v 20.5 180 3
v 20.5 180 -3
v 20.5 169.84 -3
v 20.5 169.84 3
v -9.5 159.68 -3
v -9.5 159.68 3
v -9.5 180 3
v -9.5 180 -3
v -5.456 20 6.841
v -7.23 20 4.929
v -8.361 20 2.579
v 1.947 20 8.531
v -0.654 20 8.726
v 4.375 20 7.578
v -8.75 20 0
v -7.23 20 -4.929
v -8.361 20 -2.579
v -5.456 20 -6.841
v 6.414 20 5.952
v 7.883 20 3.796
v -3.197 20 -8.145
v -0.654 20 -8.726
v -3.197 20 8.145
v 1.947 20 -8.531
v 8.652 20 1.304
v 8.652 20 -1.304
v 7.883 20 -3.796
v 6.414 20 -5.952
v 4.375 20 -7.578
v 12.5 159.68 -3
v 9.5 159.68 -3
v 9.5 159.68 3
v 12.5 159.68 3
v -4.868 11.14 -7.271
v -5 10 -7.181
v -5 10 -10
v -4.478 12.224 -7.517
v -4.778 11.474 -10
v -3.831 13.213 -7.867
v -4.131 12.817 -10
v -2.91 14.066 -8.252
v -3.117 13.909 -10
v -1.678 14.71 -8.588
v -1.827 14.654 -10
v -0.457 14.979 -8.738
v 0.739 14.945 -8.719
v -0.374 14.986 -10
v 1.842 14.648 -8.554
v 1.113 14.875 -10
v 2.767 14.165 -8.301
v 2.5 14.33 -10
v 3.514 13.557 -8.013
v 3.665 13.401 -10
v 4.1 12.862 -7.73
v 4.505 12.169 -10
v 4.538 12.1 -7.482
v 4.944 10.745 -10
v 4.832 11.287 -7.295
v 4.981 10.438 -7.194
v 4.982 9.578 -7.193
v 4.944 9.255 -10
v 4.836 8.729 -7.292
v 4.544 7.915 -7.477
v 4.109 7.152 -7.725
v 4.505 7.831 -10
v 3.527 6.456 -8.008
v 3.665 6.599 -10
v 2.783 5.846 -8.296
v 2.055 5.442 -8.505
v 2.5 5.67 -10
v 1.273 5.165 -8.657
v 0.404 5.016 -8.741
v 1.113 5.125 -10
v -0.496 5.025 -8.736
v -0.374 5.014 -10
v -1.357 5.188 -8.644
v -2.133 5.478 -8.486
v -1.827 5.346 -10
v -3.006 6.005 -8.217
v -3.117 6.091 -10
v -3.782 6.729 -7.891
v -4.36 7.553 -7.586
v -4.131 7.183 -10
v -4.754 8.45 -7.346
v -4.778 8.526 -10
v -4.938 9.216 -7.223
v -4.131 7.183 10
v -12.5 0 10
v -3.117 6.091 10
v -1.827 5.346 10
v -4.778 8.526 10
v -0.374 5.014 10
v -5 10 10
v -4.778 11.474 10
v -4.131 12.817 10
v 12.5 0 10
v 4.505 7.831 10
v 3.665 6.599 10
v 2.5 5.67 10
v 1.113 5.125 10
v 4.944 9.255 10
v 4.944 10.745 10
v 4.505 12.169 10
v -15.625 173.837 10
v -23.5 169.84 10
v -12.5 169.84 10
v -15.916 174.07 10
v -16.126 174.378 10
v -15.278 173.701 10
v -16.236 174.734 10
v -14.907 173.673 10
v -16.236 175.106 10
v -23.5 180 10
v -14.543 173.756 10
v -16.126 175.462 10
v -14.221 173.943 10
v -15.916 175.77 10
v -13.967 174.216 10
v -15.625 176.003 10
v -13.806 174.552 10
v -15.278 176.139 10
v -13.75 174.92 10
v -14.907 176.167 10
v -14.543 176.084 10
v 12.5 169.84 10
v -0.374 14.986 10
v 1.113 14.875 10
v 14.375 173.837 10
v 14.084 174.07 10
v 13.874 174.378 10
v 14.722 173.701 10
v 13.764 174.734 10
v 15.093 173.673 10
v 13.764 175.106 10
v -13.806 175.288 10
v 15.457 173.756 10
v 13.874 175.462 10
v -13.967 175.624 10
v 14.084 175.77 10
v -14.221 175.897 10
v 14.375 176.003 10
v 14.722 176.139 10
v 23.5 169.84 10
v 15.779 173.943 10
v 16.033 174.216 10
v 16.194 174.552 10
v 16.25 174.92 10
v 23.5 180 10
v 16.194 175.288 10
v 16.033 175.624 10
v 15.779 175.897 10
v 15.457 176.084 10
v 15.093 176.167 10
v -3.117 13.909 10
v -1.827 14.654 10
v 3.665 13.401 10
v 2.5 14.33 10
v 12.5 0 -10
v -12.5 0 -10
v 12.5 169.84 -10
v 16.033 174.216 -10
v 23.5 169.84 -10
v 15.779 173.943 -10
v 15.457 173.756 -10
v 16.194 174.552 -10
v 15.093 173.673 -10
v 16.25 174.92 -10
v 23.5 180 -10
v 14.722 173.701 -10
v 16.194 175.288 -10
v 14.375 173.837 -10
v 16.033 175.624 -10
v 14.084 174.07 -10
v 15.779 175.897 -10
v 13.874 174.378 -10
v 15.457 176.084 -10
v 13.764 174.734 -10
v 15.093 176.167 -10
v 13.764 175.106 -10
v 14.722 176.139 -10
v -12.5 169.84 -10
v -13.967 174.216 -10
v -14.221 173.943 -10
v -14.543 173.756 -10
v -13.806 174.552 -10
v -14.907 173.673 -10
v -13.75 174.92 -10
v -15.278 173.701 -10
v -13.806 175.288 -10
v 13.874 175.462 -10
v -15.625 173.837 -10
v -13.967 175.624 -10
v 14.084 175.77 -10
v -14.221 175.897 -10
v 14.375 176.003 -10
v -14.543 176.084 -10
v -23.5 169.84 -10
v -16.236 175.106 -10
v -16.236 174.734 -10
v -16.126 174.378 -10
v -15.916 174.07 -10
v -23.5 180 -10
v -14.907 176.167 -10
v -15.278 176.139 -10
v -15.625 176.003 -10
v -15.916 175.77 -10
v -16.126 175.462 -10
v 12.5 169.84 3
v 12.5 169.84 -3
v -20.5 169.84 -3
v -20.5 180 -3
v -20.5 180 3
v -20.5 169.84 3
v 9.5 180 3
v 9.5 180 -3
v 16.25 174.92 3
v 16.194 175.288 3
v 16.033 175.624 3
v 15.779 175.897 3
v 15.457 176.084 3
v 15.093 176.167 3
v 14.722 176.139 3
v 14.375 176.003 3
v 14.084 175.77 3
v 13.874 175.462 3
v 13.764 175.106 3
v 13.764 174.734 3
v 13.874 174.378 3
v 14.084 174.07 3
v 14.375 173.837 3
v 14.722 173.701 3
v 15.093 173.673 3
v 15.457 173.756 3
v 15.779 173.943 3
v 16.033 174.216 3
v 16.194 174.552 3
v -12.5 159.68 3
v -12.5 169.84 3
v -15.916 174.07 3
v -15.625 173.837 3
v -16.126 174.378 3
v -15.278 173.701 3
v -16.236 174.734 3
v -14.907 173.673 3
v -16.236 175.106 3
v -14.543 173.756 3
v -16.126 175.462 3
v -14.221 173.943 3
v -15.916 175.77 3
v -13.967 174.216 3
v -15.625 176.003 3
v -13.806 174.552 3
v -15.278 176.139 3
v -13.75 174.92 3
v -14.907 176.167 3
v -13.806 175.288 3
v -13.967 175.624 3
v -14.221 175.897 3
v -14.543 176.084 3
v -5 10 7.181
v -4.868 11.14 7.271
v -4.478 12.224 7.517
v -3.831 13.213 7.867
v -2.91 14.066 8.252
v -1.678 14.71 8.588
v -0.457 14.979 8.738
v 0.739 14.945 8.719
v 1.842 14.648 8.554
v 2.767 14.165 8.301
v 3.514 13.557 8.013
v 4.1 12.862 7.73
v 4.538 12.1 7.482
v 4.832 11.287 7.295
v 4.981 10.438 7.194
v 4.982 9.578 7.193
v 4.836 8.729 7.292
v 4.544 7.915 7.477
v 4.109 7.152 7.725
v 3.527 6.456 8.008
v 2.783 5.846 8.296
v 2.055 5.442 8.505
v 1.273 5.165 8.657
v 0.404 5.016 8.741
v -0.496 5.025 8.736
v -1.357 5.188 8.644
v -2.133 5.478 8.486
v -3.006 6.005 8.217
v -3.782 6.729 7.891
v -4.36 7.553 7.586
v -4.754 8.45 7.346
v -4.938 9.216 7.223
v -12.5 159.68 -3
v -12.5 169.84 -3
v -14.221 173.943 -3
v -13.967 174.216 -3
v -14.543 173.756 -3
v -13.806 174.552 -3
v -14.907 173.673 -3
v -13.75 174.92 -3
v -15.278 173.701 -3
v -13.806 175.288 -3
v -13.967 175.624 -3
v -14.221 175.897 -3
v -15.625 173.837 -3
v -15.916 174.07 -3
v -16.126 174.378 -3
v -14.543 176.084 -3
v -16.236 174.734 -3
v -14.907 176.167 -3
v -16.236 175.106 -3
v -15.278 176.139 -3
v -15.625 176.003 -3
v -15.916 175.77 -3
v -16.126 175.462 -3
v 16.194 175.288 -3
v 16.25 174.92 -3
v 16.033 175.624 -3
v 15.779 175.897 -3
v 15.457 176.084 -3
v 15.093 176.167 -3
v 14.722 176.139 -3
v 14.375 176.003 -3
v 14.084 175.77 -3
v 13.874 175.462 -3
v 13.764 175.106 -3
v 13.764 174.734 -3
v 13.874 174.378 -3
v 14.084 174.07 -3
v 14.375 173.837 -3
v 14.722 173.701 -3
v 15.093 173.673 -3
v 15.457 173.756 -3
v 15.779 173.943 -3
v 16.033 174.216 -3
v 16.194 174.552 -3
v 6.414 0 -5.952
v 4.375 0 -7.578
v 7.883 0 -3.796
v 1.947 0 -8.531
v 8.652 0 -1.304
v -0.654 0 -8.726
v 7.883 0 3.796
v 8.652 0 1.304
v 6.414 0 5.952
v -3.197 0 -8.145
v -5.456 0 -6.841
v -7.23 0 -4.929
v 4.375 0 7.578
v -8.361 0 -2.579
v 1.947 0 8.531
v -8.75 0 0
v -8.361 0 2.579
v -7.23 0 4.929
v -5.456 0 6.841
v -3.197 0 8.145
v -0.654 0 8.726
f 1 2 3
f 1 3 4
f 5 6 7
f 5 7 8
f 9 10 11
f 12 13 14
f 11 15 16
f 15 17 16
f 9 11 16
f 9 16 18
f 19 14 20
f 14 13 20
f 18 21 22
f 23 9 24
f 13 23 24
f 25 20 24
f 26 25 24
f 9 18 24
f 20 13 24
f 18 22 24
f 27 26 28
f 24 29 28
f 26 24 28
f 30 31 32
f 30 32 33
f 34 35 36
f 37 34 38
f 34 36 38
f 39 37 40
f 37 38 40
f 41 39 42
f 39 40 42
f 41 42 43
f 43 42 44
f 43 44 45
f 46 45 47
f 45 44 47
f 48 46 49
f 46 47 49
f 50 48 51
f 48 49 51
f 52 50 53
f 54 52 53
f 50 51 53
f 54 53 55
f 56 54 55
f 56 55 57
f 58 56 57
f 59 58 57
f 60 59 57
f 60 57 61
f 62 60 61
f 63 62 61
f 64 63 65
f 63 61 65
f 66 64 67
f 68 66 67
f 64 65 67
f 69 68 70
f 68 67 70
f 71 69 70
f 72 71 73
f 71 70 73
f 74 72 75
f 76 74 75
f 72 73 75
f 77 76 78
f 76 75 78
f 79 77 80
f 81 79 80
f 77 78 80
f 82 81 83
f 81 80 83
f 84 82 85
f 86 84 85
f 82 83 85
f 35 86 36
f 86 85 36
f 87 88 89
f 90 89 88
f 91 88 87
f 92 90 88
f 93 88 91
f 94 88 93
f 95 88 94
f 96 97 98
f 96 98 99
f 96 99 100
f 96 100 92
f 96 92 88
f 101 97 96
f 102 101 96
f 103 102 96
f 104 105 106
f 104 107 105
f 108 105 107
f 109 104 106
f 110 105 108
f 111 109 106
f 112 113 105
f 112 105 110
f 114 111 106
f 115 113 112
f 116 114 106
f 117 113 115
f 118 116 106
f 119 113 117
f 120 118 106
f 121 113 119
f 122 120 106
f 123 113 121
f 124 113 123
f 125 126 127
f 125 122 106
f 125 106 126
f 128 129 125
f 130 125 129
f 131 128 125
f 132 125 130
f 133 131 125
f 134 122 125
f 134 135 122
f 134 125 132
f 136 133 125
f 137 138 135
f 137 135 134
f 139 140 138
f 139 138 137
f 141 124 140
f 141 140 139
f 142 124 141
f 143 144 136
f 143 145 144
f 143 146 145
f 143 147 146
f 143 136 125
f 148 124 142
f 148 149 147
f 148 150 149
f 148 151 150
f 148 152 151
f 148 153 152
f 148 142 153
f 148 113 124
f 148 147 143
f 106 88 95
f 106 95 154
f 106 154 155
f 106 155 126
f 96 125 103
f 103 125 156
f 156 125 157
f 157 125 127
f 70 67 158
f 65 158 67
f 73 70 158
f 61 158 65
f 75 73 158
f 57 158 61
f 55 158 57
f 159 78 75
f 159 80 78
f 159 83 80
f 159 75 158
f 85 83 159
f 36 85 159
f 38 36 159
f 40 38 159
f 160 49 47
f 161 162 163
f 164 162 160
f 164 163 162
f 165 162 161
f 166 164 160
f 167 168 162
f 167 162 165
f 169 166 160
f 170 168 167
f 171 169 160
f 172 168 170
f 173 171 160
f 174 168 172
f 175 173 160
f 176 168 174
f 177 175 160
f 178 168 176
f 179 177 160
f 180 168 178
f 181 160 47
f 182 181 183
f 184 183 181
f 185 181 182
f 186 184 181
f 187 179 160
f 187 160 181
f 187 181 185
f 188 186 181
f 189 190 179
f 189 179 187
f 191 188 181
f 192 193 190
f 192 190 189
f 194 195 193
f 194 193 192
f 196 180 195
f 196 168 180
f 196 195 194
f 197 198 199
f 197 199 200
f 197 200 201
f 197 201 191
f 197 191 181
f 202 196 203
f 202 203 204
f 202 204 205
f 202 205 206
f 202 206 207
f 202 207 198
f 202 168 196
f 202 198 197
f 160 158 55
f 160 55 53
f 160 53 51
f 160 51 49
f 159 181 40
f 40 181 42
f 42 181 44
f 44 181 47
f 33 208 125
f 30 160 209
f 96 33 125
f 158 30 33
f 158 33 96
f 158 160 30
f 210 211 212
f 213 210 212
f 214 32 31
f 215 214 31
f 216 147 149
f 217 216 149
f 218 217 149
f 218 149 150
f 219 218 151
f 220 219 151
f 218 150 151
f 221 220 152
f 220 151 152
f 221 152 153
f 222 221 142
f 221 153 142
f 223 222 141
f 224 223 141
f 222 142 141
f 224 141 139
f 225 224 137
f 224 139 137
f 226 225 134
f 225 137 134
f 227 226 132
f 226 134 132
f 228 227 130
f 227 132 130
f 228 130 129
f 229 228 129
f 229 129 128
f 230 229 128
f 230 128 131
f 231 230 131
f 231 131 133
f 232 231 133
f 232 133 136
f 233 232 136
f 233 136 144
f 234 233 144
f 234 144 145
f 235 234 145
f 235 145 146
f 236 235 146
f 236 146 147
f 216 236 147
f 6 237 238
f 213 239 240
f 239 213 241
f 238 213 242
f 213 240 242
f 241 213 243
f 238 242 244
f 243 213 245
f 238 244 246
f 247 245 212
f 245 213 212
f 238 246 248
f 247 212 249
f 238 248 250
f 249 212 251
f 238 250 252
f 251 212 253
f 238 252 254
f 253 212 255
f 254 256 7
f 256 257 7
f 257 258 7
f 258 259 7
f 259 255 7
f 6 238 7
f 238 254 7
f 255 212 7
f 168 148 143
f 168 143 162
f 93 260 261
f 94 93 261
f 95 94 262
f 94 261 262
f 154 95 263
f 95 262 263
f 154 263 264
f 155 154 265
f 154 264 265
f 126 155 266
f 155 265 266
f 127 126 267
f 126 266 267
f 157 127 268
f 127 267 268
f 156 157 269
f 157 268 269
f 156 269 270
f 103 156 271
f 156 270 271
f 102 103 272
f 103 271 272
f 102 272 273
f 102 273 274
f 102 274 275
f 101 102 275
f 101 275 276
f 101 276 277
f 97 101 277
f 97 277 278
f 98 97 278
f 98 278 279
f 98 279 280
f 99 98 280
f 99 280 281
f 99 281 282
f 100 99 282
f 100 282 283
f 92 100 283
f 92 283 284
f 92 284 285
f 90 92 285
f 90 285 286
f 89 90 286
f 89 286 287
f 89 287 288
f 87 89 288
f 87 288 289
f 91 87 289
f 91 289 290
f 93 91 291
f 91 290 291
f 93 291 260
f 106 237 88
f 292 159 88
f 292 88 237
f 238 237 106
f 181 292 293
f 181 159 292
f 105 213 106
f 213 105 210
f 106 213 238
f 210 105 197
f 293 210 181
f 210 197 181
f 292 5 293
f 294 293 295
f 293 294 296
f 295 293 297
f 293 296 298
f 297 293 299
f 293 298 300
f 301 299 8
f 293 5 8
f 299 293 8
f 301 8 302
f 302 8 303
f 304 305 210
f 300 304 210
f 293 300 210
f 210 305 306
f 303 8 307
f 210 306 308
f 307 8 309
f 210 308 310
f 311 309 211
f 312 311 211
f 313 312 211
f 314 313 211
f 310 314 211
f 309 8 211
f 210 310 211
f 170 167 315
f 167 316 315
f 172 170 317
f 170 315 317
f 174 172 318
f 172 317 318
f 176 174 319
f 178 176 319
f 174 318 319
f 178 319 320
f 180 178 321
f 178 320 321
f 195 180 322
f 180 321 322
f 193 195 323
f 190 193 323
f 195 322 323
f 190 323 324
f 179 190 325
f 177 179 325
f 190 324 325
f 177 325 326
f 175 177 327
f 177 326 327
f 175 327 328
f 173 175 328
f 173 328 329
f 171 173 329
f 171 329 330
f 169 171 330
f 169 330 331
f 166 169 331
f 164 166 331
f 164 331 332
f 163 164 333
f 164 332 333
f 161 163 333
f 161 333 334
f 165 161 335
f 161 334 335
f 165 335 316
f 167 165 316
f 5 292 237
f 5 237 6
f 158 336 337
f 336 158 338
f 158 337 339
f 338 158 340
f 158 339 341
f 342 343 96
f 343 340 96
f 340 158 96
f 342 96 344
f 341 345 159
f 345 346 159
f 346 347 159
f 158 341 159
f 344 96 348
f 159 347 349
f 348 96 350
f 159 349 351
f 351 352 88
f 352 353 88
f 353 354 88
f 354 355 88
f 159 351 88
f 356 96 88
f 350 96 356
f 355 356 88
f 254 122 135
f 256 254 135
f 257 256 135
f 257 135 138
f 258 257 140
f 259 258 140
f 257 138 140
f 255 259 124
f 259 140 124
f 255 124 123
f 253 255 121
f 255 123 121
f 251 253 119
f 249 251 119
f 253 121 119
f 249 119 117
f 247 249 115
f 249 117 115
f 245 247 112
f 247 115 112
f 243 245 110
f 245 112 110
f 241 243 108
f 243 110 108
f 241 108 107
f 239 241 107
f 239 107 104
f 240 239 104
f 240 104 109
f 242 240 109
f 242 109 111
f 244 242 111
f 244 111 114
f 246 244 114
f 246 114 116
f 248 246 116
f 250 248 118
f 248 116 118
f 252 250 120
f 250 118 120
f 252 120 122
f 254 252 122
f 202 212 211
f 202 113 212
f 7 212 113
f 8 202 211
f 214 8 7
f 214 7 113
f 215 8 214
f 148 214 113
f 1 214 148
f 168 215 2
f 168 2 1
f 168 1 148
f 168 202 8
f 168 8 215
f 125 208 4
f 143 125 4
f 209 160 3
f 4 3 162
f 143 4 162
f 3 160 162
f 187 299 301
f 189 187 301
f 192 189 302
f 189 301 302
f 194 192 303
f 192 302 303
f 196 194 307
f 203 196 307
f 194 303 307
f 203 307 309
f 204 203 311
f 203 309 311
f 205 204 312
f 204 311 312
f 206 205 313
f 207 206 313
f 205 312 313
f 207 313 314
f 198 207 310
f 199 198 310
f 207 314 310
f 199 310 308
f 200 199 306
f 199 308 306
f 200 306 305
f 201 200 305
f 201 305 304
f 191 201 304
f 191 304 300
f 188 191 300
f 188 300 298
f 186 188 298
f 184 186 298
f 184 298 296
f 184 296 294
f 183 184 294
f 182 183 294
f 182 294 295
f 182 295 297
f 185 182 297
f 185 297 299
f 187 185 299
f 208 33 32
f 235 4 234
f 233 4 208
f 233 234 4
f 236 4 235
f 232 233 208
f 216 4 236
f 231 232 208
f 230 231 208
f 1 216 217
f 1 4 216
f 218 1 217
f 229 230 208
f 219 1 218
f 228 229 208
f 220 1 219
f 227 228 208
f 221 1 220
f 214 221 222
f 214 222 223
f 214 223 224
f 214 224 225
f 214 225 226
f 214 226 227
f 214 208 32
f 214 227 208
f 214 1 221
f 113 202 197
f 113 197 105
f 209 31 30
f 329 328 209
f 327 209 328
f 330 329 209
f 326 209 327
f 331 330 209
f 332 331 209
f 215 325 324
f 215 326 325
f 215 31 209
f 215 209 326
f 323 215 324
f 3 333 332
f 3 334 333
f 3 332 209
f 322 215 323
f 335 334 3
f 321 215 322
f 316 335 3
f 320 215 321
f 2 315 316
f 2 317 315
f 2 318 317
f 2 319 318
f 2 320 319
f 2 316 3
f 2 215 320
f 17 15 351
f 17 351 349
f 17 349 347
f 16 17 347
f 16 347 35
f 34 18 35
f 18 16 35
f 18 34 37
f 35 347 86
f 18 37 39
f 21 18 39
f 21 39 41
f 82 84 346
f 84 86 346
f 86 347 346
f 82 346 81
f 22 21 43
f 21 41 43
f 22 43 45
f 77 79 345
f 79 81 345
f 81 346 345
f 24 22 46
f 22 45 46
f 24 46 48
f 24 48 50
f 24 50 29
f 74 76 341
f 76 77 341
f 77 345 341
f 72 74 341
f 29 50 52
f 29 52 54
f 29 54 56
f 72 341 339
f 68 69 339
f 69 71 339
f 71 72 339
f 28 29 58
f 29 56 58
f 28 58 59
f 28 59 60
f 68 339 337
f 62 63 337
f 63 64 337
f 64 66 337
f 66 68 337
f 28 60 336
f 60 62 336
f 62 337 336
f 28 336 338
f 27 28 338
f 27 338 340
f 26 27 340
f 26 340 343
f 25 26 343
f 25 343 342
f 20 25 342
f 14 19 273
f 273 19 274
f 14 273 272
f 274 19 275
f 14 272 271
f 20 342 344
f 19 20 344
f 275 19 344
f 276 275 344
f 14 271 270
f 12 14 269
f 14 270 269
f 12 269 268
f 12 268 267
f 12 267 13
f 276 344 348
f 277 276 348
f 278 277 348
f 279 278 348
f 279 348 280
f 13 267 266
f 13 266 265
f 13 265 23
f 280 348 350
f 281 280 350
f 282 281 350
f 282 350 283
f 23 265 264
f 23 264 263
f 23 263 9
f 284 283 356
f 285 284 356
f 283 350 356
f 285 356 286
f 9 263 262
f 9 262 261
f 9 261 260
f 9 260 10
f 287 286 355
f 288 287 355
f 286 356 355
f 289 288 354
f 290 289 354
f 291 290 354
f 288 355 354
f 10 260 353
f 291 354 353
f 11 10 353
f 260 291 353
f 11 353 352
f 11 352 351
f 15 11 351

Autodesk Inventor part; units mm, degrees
ref_plane "YZ Plane" through (0, 0, 0) normal (1, 0, 0) x (0, 1, 0)
sketch "스케치1" plane through (0, 0, 0) normal (0, 1, 0) x (-1, 0, 0)
  line L0 (-12.5, 10) -> (12.5, 10)
  line L1 (12.5, 10) -> (12.5, -10)
  line L2 (12.5, -10) -> (-12.5, -10)
  line L3 (-12.5, -10) -> (-12.5, 10)
  line L4 (-12.5, 10) -> (12.5, -10) construction
  line L5 (12.5, 10) -> (-12.5, -10) construction
  circle A0 centre (0, 0) radius 8.75
  dimension "d0" = 25
  dimension "d1" = 20
  dimension "d2" = 17.5
extrude "돌출1" add sketch "스케치1" along normal blind 20
sketch "스케치2" plane through (12.5, 0, -10) normal (0, 0, -1) x (-1, 0, 0)
  circle A0 centre (12.5, 10) radius 5
  line L0 (0, 0) -> (25, 0) projected
  point P0 (12.5, 0)
  point P1 (12.5, 0)
  point P2 (12.5, 0)
  dimension "d5" = 10
  dimension "d6" = 10
extrude "돌출2" cut sketch "스케치2" against normal up to surface (20 mm away)
sketch "스케치3" plane through (0, 20, 0) normal (0, 1, 0) x (1, 0, 0)
  line L0 (12.5, 10) -> (-12.5, 10) projected
  line L1 (-12.5, 10) -> (-12.5, -10) projected
  line L2 (-12.5, -10) -> (12.5, -10) projected
  line L3 (12.5, -10) -> (12.5, 10) projected
  circle A0 centre (0, 0) radius 8.75 projected
extrude "돌출3" add sketch "스케치3" along normal blind 160 contours L3 L2 L1 L0 | A0
sketch "스케치21" plane through (-12.5, 0, 10) normal (0, 0, 1) x (1, 0, 0)
  line L0 (25, 180) -> (0, 180) projected
  line L1 (25, 0) -> (25, 180) projected
  line L2 (0, 180) -> (25, 180)
  line L3 (25, 180) -> (25, 165)
  line L4 (25, 165) -> (0, 165)
  line L5 (0, 165) -> (0, 180)
  point P0 (12.5, 0)
  dimension "d153" = 15
extrude "돌출8" cut sketch "스케치21" against normal blind 0.5
ref_plane "작업 평면1" through (12.5, 0, 0) normal (0, 0, -1) x (-1, 0, 0)
mirror "미러1" about plane through (12.5, 0, 0) normal (0, 0, -1) of "돌출8"
sketch "스케치23" plane through (0, 180, 0) normal (0, 1, 0) x (1, 0, 0)
  circle A0 centre (0, 0) radius 4.5
  line L0 (-2.5981, -4.5) -> (-5.1962, 0)
  line L1 (-5.1962, 0) -> (-2.5981, 4.5)
  line L2 (-2.5981, 4.5) -> (2.5981, 4.5)
  line L3 (2.5981, 4.5) -> (5.1962, 0)
  line L4 (5.1962, 0) -> (2.5981, -4.5)
  line L5 (2.5981, -4.5) -> (-2.5981, -4.5)
  dimension "d162" = 9
extrude "돌출10" cut sketch "스케치23" against normal blind 8
sketch "스케치25" plane through (0, 172, 0) normal (0, 1, 0) x (1, 0, 0)
  line L0 (2.0207, 3.5) -> (4.0415, 0)
  line L1 (4.0415, 0) -> (2.0207, -3.5)
  line L2 (2.0207, -3.5) -> (-2.0207, -3.5)
  line L3 (-2.0207, -3.5) -> (-4.0415, 0)
  line L4 (-4.0415, 0) -> (-2.0207, 3.5)
  line L5 (-2.0207, 3.5) -> (2.0207, 3.5)
  line L6 (-5.1962, 0) -> (-2.5981, 4.5) projected
  line L7 (2.5981, -4.5) -> (-2.5981, -4.5) projected
  line L8 (5.1962, 0) -> (2.5981, -4.5) projected
  line L9 (2.5981, 4.5) -> (5.1962, 0) projected
  line L10 (-2.5981, 4.5) -> (2.5981, 4.5) projected
  line L11 (-5.1962, 0) -> (-2.5981, 4.5) projected
  line L12 (-2.5981, -4.5) -> (-5.1962, 0) projected
  point P0 (0, 0)
  point P1 (0, 0)
  dimension "d166" = 1
extrude "돌출11" add sketch "스케치25" along normal blind 4.5
sketch "스케치26" plane through (0, 180, 0) normal (0, 1, 0) x (1, 0, 0)
  line L0 (23.5, 10) -> (-23.5, 10)
  line L1 (-23.5, 10) -> (-23.5, -10)
  line L2 (-23.5, -10) -> (23.5, -10)
  line L3 (23.5, -10) -> (23.5, 10)
  line L4 (23.5, 10) -> (-23.5, -10) construction
  line L5 (-23.5, 10) -> (23.5, -10) construction
  line L6 (-9.5, 3) -> (-20.5, 3)
  line L7 (-20.5, 3) -> (-20.5, -3)
  line L8 (-20.5, -3) -> (-9.5, -3)
  line L9 (-9.5, -3) -> (-9.5, 3)
  line L10 (-9.5, 3) -> (-20.5, -3) construction
  line L11 (-20.5, 3) -> (-9.5, -3) construction
  line L12 (-12.5, -9.5) -> (12.5, -9.5) projected
  line L13 (0, -9.5) -> (0, 10)
  line L14 (-5, 10) -> (5, 10) projected
  line L15 (23.5, 10) -> (23.5, -10)
  line L16 (9.5, 3) -> (20.5, 3)
  line L17 (20.5, 3) -> (20.5, -3)
  line L18 (20.5, -3) -> (9.5, -3)
  line L19 (9.5, -3) -> (9.5, 3)
  point P0 (0, 0)
  point P1 (-15, 0)
  dimension "d169" = 15
  dimension "d170" = 11
  dimension "d172" = 3
  dimension "d173" = 6
  dimension "d174" = 7
extrude "돌출12" add sketch "스케치26" against normal blind 10.16
sketch "스케치27" plane through (0, 180, 0) normal (0, 1, 0) x (1, 0, 0)
  line L0 (-9.5, 3) -> (-12.5, 3)
  line L1 (-12.5, 3) -> (-12.5, -3)
  line L2 (-12.5, -3) -> (-9.5, -3)
  line L3 (-9.5, -3) -> (-9.5, 3)
  line L4 (-9.5, 3) -> (-12.5, -3) construction
  line L5 (-12.5, 3) -> (-9.5, -3) construction
  line L6 (0, 0) -> (0, 9.5)
  line L7 (12.5, 9.5) -> (-12.5, 9.5) projected
  line L8 (9.5, 3) -> (12.5, 3)
  line L9 (12.5, 3) -> (12.5, -3)
  line L10 (12.5, -3) -> (9.5, -3)
  line L11 (9.5, -3) -> (9.5, 3)
  line L12 (9.5, 3) -> (12.5, -3) construction
  line L13 (12.5, 3) -> (9.5, -3) construction
  point P0 (-11, 0)
  point P1 (11, 0)
  dimension "d177" = 9.5
  dimension "d178" = 3
  dimension "d179" = 6
extrude "돌출13" cut sketch "스케치27" against normal blind 20.32
sketch "스케치28" plane through (-12.5, 0, 10) normal (0, 0, 1) x (1, 0, 0)
  line L0 (7.5, 87.5) -> (17.5, 87.5)
  line L1 (17.5, 87.5) -> (17.5, 77.5)
  line L2 (17.5, 77.5) -> (7.5, 77.5)
  line L3 (7.5, 77.5) -> (7.5, 87.5)
  line L4 (7.5, 87.5) -> (17.5, 77.5) construction
  line L5 (17.5, 87.5) -> (7.5, 77.5) construction
  line L6 (0, 0) -> (25, 0) projected
  line L7 (0, 0) -> (0, 165) projected
  point P0 (12.5, 0)
  point P1 (12.5, 82.5)
  point P2 (12.5, 0)
  point P3 (0, 82.5)
  dimension "d184" = 10
  dimension "d185" = 10
sketch "스케치29" plane through (12.5, 165, -9.5) normal (0, 0, -1) x (-1, 0, 0)
  line L0 (0, 0) -> (25, 0) projected
  line L1 (25, 4.84) -> (25, 0) projected
  line L2 (0, 0) -> (0, 4.84) projected
  line L3 (25, 4.84) -> (0, 4.84) projected
  point P0 (12.5, -165)
extrude "돌출14" add sketch "스케치29" along normal blind 0.5
ref_plane "작업 평면2" through (12.5, 0, 0) normal (0, 0, -1) x (-1, 0, 0)
mirror "미러2" about plane through (12.5, 0, 0) normal (0, 0, -1) of "돌출14"
sketch "스케치30" plane through (-12.5, 0, 10) normal (0, 0, 1) x (1, 0, 0)
  circle A0 centre (27.5, 174.92) radius 1.25
  line L0 (36, 180) -> (36, 169.84) projected
  line L1 (0, 0) -> (0, 169.84) projected
  line L2 (25, 0) -> (25, 169.84) projected
  line L3 (0, 169.84) -> (25, 169.84)
  line L4 (25, 169.84) -> (12.5, 169.84)
  line L5 (-11, 180) -> (36, 180) projected
  line L6 (12.5, 180) -> (12.5, 169.84)
  circle A1 centre (-2.5, 174.92) radius 1.25
  point P0 (12.5, 0)
  point P1 (36, 174.92)
  dimension "d186" = 2.5
  dimension "d187" = 8.5
extrude "돌출15" cut sketch "스케치30" against normal up to surface (20 mm away)
equation "\"d34\" = 55deg"
equation "\"d54\" = 55deg"
equation "\"d74\" = 55deg"
equation "\"d94\" = 55deg"
equation "\"d116\" = 55deg"
equation "\"d136\" = 55deg"
properties part number "Tensile_test_bottom_adapter_blocked"
